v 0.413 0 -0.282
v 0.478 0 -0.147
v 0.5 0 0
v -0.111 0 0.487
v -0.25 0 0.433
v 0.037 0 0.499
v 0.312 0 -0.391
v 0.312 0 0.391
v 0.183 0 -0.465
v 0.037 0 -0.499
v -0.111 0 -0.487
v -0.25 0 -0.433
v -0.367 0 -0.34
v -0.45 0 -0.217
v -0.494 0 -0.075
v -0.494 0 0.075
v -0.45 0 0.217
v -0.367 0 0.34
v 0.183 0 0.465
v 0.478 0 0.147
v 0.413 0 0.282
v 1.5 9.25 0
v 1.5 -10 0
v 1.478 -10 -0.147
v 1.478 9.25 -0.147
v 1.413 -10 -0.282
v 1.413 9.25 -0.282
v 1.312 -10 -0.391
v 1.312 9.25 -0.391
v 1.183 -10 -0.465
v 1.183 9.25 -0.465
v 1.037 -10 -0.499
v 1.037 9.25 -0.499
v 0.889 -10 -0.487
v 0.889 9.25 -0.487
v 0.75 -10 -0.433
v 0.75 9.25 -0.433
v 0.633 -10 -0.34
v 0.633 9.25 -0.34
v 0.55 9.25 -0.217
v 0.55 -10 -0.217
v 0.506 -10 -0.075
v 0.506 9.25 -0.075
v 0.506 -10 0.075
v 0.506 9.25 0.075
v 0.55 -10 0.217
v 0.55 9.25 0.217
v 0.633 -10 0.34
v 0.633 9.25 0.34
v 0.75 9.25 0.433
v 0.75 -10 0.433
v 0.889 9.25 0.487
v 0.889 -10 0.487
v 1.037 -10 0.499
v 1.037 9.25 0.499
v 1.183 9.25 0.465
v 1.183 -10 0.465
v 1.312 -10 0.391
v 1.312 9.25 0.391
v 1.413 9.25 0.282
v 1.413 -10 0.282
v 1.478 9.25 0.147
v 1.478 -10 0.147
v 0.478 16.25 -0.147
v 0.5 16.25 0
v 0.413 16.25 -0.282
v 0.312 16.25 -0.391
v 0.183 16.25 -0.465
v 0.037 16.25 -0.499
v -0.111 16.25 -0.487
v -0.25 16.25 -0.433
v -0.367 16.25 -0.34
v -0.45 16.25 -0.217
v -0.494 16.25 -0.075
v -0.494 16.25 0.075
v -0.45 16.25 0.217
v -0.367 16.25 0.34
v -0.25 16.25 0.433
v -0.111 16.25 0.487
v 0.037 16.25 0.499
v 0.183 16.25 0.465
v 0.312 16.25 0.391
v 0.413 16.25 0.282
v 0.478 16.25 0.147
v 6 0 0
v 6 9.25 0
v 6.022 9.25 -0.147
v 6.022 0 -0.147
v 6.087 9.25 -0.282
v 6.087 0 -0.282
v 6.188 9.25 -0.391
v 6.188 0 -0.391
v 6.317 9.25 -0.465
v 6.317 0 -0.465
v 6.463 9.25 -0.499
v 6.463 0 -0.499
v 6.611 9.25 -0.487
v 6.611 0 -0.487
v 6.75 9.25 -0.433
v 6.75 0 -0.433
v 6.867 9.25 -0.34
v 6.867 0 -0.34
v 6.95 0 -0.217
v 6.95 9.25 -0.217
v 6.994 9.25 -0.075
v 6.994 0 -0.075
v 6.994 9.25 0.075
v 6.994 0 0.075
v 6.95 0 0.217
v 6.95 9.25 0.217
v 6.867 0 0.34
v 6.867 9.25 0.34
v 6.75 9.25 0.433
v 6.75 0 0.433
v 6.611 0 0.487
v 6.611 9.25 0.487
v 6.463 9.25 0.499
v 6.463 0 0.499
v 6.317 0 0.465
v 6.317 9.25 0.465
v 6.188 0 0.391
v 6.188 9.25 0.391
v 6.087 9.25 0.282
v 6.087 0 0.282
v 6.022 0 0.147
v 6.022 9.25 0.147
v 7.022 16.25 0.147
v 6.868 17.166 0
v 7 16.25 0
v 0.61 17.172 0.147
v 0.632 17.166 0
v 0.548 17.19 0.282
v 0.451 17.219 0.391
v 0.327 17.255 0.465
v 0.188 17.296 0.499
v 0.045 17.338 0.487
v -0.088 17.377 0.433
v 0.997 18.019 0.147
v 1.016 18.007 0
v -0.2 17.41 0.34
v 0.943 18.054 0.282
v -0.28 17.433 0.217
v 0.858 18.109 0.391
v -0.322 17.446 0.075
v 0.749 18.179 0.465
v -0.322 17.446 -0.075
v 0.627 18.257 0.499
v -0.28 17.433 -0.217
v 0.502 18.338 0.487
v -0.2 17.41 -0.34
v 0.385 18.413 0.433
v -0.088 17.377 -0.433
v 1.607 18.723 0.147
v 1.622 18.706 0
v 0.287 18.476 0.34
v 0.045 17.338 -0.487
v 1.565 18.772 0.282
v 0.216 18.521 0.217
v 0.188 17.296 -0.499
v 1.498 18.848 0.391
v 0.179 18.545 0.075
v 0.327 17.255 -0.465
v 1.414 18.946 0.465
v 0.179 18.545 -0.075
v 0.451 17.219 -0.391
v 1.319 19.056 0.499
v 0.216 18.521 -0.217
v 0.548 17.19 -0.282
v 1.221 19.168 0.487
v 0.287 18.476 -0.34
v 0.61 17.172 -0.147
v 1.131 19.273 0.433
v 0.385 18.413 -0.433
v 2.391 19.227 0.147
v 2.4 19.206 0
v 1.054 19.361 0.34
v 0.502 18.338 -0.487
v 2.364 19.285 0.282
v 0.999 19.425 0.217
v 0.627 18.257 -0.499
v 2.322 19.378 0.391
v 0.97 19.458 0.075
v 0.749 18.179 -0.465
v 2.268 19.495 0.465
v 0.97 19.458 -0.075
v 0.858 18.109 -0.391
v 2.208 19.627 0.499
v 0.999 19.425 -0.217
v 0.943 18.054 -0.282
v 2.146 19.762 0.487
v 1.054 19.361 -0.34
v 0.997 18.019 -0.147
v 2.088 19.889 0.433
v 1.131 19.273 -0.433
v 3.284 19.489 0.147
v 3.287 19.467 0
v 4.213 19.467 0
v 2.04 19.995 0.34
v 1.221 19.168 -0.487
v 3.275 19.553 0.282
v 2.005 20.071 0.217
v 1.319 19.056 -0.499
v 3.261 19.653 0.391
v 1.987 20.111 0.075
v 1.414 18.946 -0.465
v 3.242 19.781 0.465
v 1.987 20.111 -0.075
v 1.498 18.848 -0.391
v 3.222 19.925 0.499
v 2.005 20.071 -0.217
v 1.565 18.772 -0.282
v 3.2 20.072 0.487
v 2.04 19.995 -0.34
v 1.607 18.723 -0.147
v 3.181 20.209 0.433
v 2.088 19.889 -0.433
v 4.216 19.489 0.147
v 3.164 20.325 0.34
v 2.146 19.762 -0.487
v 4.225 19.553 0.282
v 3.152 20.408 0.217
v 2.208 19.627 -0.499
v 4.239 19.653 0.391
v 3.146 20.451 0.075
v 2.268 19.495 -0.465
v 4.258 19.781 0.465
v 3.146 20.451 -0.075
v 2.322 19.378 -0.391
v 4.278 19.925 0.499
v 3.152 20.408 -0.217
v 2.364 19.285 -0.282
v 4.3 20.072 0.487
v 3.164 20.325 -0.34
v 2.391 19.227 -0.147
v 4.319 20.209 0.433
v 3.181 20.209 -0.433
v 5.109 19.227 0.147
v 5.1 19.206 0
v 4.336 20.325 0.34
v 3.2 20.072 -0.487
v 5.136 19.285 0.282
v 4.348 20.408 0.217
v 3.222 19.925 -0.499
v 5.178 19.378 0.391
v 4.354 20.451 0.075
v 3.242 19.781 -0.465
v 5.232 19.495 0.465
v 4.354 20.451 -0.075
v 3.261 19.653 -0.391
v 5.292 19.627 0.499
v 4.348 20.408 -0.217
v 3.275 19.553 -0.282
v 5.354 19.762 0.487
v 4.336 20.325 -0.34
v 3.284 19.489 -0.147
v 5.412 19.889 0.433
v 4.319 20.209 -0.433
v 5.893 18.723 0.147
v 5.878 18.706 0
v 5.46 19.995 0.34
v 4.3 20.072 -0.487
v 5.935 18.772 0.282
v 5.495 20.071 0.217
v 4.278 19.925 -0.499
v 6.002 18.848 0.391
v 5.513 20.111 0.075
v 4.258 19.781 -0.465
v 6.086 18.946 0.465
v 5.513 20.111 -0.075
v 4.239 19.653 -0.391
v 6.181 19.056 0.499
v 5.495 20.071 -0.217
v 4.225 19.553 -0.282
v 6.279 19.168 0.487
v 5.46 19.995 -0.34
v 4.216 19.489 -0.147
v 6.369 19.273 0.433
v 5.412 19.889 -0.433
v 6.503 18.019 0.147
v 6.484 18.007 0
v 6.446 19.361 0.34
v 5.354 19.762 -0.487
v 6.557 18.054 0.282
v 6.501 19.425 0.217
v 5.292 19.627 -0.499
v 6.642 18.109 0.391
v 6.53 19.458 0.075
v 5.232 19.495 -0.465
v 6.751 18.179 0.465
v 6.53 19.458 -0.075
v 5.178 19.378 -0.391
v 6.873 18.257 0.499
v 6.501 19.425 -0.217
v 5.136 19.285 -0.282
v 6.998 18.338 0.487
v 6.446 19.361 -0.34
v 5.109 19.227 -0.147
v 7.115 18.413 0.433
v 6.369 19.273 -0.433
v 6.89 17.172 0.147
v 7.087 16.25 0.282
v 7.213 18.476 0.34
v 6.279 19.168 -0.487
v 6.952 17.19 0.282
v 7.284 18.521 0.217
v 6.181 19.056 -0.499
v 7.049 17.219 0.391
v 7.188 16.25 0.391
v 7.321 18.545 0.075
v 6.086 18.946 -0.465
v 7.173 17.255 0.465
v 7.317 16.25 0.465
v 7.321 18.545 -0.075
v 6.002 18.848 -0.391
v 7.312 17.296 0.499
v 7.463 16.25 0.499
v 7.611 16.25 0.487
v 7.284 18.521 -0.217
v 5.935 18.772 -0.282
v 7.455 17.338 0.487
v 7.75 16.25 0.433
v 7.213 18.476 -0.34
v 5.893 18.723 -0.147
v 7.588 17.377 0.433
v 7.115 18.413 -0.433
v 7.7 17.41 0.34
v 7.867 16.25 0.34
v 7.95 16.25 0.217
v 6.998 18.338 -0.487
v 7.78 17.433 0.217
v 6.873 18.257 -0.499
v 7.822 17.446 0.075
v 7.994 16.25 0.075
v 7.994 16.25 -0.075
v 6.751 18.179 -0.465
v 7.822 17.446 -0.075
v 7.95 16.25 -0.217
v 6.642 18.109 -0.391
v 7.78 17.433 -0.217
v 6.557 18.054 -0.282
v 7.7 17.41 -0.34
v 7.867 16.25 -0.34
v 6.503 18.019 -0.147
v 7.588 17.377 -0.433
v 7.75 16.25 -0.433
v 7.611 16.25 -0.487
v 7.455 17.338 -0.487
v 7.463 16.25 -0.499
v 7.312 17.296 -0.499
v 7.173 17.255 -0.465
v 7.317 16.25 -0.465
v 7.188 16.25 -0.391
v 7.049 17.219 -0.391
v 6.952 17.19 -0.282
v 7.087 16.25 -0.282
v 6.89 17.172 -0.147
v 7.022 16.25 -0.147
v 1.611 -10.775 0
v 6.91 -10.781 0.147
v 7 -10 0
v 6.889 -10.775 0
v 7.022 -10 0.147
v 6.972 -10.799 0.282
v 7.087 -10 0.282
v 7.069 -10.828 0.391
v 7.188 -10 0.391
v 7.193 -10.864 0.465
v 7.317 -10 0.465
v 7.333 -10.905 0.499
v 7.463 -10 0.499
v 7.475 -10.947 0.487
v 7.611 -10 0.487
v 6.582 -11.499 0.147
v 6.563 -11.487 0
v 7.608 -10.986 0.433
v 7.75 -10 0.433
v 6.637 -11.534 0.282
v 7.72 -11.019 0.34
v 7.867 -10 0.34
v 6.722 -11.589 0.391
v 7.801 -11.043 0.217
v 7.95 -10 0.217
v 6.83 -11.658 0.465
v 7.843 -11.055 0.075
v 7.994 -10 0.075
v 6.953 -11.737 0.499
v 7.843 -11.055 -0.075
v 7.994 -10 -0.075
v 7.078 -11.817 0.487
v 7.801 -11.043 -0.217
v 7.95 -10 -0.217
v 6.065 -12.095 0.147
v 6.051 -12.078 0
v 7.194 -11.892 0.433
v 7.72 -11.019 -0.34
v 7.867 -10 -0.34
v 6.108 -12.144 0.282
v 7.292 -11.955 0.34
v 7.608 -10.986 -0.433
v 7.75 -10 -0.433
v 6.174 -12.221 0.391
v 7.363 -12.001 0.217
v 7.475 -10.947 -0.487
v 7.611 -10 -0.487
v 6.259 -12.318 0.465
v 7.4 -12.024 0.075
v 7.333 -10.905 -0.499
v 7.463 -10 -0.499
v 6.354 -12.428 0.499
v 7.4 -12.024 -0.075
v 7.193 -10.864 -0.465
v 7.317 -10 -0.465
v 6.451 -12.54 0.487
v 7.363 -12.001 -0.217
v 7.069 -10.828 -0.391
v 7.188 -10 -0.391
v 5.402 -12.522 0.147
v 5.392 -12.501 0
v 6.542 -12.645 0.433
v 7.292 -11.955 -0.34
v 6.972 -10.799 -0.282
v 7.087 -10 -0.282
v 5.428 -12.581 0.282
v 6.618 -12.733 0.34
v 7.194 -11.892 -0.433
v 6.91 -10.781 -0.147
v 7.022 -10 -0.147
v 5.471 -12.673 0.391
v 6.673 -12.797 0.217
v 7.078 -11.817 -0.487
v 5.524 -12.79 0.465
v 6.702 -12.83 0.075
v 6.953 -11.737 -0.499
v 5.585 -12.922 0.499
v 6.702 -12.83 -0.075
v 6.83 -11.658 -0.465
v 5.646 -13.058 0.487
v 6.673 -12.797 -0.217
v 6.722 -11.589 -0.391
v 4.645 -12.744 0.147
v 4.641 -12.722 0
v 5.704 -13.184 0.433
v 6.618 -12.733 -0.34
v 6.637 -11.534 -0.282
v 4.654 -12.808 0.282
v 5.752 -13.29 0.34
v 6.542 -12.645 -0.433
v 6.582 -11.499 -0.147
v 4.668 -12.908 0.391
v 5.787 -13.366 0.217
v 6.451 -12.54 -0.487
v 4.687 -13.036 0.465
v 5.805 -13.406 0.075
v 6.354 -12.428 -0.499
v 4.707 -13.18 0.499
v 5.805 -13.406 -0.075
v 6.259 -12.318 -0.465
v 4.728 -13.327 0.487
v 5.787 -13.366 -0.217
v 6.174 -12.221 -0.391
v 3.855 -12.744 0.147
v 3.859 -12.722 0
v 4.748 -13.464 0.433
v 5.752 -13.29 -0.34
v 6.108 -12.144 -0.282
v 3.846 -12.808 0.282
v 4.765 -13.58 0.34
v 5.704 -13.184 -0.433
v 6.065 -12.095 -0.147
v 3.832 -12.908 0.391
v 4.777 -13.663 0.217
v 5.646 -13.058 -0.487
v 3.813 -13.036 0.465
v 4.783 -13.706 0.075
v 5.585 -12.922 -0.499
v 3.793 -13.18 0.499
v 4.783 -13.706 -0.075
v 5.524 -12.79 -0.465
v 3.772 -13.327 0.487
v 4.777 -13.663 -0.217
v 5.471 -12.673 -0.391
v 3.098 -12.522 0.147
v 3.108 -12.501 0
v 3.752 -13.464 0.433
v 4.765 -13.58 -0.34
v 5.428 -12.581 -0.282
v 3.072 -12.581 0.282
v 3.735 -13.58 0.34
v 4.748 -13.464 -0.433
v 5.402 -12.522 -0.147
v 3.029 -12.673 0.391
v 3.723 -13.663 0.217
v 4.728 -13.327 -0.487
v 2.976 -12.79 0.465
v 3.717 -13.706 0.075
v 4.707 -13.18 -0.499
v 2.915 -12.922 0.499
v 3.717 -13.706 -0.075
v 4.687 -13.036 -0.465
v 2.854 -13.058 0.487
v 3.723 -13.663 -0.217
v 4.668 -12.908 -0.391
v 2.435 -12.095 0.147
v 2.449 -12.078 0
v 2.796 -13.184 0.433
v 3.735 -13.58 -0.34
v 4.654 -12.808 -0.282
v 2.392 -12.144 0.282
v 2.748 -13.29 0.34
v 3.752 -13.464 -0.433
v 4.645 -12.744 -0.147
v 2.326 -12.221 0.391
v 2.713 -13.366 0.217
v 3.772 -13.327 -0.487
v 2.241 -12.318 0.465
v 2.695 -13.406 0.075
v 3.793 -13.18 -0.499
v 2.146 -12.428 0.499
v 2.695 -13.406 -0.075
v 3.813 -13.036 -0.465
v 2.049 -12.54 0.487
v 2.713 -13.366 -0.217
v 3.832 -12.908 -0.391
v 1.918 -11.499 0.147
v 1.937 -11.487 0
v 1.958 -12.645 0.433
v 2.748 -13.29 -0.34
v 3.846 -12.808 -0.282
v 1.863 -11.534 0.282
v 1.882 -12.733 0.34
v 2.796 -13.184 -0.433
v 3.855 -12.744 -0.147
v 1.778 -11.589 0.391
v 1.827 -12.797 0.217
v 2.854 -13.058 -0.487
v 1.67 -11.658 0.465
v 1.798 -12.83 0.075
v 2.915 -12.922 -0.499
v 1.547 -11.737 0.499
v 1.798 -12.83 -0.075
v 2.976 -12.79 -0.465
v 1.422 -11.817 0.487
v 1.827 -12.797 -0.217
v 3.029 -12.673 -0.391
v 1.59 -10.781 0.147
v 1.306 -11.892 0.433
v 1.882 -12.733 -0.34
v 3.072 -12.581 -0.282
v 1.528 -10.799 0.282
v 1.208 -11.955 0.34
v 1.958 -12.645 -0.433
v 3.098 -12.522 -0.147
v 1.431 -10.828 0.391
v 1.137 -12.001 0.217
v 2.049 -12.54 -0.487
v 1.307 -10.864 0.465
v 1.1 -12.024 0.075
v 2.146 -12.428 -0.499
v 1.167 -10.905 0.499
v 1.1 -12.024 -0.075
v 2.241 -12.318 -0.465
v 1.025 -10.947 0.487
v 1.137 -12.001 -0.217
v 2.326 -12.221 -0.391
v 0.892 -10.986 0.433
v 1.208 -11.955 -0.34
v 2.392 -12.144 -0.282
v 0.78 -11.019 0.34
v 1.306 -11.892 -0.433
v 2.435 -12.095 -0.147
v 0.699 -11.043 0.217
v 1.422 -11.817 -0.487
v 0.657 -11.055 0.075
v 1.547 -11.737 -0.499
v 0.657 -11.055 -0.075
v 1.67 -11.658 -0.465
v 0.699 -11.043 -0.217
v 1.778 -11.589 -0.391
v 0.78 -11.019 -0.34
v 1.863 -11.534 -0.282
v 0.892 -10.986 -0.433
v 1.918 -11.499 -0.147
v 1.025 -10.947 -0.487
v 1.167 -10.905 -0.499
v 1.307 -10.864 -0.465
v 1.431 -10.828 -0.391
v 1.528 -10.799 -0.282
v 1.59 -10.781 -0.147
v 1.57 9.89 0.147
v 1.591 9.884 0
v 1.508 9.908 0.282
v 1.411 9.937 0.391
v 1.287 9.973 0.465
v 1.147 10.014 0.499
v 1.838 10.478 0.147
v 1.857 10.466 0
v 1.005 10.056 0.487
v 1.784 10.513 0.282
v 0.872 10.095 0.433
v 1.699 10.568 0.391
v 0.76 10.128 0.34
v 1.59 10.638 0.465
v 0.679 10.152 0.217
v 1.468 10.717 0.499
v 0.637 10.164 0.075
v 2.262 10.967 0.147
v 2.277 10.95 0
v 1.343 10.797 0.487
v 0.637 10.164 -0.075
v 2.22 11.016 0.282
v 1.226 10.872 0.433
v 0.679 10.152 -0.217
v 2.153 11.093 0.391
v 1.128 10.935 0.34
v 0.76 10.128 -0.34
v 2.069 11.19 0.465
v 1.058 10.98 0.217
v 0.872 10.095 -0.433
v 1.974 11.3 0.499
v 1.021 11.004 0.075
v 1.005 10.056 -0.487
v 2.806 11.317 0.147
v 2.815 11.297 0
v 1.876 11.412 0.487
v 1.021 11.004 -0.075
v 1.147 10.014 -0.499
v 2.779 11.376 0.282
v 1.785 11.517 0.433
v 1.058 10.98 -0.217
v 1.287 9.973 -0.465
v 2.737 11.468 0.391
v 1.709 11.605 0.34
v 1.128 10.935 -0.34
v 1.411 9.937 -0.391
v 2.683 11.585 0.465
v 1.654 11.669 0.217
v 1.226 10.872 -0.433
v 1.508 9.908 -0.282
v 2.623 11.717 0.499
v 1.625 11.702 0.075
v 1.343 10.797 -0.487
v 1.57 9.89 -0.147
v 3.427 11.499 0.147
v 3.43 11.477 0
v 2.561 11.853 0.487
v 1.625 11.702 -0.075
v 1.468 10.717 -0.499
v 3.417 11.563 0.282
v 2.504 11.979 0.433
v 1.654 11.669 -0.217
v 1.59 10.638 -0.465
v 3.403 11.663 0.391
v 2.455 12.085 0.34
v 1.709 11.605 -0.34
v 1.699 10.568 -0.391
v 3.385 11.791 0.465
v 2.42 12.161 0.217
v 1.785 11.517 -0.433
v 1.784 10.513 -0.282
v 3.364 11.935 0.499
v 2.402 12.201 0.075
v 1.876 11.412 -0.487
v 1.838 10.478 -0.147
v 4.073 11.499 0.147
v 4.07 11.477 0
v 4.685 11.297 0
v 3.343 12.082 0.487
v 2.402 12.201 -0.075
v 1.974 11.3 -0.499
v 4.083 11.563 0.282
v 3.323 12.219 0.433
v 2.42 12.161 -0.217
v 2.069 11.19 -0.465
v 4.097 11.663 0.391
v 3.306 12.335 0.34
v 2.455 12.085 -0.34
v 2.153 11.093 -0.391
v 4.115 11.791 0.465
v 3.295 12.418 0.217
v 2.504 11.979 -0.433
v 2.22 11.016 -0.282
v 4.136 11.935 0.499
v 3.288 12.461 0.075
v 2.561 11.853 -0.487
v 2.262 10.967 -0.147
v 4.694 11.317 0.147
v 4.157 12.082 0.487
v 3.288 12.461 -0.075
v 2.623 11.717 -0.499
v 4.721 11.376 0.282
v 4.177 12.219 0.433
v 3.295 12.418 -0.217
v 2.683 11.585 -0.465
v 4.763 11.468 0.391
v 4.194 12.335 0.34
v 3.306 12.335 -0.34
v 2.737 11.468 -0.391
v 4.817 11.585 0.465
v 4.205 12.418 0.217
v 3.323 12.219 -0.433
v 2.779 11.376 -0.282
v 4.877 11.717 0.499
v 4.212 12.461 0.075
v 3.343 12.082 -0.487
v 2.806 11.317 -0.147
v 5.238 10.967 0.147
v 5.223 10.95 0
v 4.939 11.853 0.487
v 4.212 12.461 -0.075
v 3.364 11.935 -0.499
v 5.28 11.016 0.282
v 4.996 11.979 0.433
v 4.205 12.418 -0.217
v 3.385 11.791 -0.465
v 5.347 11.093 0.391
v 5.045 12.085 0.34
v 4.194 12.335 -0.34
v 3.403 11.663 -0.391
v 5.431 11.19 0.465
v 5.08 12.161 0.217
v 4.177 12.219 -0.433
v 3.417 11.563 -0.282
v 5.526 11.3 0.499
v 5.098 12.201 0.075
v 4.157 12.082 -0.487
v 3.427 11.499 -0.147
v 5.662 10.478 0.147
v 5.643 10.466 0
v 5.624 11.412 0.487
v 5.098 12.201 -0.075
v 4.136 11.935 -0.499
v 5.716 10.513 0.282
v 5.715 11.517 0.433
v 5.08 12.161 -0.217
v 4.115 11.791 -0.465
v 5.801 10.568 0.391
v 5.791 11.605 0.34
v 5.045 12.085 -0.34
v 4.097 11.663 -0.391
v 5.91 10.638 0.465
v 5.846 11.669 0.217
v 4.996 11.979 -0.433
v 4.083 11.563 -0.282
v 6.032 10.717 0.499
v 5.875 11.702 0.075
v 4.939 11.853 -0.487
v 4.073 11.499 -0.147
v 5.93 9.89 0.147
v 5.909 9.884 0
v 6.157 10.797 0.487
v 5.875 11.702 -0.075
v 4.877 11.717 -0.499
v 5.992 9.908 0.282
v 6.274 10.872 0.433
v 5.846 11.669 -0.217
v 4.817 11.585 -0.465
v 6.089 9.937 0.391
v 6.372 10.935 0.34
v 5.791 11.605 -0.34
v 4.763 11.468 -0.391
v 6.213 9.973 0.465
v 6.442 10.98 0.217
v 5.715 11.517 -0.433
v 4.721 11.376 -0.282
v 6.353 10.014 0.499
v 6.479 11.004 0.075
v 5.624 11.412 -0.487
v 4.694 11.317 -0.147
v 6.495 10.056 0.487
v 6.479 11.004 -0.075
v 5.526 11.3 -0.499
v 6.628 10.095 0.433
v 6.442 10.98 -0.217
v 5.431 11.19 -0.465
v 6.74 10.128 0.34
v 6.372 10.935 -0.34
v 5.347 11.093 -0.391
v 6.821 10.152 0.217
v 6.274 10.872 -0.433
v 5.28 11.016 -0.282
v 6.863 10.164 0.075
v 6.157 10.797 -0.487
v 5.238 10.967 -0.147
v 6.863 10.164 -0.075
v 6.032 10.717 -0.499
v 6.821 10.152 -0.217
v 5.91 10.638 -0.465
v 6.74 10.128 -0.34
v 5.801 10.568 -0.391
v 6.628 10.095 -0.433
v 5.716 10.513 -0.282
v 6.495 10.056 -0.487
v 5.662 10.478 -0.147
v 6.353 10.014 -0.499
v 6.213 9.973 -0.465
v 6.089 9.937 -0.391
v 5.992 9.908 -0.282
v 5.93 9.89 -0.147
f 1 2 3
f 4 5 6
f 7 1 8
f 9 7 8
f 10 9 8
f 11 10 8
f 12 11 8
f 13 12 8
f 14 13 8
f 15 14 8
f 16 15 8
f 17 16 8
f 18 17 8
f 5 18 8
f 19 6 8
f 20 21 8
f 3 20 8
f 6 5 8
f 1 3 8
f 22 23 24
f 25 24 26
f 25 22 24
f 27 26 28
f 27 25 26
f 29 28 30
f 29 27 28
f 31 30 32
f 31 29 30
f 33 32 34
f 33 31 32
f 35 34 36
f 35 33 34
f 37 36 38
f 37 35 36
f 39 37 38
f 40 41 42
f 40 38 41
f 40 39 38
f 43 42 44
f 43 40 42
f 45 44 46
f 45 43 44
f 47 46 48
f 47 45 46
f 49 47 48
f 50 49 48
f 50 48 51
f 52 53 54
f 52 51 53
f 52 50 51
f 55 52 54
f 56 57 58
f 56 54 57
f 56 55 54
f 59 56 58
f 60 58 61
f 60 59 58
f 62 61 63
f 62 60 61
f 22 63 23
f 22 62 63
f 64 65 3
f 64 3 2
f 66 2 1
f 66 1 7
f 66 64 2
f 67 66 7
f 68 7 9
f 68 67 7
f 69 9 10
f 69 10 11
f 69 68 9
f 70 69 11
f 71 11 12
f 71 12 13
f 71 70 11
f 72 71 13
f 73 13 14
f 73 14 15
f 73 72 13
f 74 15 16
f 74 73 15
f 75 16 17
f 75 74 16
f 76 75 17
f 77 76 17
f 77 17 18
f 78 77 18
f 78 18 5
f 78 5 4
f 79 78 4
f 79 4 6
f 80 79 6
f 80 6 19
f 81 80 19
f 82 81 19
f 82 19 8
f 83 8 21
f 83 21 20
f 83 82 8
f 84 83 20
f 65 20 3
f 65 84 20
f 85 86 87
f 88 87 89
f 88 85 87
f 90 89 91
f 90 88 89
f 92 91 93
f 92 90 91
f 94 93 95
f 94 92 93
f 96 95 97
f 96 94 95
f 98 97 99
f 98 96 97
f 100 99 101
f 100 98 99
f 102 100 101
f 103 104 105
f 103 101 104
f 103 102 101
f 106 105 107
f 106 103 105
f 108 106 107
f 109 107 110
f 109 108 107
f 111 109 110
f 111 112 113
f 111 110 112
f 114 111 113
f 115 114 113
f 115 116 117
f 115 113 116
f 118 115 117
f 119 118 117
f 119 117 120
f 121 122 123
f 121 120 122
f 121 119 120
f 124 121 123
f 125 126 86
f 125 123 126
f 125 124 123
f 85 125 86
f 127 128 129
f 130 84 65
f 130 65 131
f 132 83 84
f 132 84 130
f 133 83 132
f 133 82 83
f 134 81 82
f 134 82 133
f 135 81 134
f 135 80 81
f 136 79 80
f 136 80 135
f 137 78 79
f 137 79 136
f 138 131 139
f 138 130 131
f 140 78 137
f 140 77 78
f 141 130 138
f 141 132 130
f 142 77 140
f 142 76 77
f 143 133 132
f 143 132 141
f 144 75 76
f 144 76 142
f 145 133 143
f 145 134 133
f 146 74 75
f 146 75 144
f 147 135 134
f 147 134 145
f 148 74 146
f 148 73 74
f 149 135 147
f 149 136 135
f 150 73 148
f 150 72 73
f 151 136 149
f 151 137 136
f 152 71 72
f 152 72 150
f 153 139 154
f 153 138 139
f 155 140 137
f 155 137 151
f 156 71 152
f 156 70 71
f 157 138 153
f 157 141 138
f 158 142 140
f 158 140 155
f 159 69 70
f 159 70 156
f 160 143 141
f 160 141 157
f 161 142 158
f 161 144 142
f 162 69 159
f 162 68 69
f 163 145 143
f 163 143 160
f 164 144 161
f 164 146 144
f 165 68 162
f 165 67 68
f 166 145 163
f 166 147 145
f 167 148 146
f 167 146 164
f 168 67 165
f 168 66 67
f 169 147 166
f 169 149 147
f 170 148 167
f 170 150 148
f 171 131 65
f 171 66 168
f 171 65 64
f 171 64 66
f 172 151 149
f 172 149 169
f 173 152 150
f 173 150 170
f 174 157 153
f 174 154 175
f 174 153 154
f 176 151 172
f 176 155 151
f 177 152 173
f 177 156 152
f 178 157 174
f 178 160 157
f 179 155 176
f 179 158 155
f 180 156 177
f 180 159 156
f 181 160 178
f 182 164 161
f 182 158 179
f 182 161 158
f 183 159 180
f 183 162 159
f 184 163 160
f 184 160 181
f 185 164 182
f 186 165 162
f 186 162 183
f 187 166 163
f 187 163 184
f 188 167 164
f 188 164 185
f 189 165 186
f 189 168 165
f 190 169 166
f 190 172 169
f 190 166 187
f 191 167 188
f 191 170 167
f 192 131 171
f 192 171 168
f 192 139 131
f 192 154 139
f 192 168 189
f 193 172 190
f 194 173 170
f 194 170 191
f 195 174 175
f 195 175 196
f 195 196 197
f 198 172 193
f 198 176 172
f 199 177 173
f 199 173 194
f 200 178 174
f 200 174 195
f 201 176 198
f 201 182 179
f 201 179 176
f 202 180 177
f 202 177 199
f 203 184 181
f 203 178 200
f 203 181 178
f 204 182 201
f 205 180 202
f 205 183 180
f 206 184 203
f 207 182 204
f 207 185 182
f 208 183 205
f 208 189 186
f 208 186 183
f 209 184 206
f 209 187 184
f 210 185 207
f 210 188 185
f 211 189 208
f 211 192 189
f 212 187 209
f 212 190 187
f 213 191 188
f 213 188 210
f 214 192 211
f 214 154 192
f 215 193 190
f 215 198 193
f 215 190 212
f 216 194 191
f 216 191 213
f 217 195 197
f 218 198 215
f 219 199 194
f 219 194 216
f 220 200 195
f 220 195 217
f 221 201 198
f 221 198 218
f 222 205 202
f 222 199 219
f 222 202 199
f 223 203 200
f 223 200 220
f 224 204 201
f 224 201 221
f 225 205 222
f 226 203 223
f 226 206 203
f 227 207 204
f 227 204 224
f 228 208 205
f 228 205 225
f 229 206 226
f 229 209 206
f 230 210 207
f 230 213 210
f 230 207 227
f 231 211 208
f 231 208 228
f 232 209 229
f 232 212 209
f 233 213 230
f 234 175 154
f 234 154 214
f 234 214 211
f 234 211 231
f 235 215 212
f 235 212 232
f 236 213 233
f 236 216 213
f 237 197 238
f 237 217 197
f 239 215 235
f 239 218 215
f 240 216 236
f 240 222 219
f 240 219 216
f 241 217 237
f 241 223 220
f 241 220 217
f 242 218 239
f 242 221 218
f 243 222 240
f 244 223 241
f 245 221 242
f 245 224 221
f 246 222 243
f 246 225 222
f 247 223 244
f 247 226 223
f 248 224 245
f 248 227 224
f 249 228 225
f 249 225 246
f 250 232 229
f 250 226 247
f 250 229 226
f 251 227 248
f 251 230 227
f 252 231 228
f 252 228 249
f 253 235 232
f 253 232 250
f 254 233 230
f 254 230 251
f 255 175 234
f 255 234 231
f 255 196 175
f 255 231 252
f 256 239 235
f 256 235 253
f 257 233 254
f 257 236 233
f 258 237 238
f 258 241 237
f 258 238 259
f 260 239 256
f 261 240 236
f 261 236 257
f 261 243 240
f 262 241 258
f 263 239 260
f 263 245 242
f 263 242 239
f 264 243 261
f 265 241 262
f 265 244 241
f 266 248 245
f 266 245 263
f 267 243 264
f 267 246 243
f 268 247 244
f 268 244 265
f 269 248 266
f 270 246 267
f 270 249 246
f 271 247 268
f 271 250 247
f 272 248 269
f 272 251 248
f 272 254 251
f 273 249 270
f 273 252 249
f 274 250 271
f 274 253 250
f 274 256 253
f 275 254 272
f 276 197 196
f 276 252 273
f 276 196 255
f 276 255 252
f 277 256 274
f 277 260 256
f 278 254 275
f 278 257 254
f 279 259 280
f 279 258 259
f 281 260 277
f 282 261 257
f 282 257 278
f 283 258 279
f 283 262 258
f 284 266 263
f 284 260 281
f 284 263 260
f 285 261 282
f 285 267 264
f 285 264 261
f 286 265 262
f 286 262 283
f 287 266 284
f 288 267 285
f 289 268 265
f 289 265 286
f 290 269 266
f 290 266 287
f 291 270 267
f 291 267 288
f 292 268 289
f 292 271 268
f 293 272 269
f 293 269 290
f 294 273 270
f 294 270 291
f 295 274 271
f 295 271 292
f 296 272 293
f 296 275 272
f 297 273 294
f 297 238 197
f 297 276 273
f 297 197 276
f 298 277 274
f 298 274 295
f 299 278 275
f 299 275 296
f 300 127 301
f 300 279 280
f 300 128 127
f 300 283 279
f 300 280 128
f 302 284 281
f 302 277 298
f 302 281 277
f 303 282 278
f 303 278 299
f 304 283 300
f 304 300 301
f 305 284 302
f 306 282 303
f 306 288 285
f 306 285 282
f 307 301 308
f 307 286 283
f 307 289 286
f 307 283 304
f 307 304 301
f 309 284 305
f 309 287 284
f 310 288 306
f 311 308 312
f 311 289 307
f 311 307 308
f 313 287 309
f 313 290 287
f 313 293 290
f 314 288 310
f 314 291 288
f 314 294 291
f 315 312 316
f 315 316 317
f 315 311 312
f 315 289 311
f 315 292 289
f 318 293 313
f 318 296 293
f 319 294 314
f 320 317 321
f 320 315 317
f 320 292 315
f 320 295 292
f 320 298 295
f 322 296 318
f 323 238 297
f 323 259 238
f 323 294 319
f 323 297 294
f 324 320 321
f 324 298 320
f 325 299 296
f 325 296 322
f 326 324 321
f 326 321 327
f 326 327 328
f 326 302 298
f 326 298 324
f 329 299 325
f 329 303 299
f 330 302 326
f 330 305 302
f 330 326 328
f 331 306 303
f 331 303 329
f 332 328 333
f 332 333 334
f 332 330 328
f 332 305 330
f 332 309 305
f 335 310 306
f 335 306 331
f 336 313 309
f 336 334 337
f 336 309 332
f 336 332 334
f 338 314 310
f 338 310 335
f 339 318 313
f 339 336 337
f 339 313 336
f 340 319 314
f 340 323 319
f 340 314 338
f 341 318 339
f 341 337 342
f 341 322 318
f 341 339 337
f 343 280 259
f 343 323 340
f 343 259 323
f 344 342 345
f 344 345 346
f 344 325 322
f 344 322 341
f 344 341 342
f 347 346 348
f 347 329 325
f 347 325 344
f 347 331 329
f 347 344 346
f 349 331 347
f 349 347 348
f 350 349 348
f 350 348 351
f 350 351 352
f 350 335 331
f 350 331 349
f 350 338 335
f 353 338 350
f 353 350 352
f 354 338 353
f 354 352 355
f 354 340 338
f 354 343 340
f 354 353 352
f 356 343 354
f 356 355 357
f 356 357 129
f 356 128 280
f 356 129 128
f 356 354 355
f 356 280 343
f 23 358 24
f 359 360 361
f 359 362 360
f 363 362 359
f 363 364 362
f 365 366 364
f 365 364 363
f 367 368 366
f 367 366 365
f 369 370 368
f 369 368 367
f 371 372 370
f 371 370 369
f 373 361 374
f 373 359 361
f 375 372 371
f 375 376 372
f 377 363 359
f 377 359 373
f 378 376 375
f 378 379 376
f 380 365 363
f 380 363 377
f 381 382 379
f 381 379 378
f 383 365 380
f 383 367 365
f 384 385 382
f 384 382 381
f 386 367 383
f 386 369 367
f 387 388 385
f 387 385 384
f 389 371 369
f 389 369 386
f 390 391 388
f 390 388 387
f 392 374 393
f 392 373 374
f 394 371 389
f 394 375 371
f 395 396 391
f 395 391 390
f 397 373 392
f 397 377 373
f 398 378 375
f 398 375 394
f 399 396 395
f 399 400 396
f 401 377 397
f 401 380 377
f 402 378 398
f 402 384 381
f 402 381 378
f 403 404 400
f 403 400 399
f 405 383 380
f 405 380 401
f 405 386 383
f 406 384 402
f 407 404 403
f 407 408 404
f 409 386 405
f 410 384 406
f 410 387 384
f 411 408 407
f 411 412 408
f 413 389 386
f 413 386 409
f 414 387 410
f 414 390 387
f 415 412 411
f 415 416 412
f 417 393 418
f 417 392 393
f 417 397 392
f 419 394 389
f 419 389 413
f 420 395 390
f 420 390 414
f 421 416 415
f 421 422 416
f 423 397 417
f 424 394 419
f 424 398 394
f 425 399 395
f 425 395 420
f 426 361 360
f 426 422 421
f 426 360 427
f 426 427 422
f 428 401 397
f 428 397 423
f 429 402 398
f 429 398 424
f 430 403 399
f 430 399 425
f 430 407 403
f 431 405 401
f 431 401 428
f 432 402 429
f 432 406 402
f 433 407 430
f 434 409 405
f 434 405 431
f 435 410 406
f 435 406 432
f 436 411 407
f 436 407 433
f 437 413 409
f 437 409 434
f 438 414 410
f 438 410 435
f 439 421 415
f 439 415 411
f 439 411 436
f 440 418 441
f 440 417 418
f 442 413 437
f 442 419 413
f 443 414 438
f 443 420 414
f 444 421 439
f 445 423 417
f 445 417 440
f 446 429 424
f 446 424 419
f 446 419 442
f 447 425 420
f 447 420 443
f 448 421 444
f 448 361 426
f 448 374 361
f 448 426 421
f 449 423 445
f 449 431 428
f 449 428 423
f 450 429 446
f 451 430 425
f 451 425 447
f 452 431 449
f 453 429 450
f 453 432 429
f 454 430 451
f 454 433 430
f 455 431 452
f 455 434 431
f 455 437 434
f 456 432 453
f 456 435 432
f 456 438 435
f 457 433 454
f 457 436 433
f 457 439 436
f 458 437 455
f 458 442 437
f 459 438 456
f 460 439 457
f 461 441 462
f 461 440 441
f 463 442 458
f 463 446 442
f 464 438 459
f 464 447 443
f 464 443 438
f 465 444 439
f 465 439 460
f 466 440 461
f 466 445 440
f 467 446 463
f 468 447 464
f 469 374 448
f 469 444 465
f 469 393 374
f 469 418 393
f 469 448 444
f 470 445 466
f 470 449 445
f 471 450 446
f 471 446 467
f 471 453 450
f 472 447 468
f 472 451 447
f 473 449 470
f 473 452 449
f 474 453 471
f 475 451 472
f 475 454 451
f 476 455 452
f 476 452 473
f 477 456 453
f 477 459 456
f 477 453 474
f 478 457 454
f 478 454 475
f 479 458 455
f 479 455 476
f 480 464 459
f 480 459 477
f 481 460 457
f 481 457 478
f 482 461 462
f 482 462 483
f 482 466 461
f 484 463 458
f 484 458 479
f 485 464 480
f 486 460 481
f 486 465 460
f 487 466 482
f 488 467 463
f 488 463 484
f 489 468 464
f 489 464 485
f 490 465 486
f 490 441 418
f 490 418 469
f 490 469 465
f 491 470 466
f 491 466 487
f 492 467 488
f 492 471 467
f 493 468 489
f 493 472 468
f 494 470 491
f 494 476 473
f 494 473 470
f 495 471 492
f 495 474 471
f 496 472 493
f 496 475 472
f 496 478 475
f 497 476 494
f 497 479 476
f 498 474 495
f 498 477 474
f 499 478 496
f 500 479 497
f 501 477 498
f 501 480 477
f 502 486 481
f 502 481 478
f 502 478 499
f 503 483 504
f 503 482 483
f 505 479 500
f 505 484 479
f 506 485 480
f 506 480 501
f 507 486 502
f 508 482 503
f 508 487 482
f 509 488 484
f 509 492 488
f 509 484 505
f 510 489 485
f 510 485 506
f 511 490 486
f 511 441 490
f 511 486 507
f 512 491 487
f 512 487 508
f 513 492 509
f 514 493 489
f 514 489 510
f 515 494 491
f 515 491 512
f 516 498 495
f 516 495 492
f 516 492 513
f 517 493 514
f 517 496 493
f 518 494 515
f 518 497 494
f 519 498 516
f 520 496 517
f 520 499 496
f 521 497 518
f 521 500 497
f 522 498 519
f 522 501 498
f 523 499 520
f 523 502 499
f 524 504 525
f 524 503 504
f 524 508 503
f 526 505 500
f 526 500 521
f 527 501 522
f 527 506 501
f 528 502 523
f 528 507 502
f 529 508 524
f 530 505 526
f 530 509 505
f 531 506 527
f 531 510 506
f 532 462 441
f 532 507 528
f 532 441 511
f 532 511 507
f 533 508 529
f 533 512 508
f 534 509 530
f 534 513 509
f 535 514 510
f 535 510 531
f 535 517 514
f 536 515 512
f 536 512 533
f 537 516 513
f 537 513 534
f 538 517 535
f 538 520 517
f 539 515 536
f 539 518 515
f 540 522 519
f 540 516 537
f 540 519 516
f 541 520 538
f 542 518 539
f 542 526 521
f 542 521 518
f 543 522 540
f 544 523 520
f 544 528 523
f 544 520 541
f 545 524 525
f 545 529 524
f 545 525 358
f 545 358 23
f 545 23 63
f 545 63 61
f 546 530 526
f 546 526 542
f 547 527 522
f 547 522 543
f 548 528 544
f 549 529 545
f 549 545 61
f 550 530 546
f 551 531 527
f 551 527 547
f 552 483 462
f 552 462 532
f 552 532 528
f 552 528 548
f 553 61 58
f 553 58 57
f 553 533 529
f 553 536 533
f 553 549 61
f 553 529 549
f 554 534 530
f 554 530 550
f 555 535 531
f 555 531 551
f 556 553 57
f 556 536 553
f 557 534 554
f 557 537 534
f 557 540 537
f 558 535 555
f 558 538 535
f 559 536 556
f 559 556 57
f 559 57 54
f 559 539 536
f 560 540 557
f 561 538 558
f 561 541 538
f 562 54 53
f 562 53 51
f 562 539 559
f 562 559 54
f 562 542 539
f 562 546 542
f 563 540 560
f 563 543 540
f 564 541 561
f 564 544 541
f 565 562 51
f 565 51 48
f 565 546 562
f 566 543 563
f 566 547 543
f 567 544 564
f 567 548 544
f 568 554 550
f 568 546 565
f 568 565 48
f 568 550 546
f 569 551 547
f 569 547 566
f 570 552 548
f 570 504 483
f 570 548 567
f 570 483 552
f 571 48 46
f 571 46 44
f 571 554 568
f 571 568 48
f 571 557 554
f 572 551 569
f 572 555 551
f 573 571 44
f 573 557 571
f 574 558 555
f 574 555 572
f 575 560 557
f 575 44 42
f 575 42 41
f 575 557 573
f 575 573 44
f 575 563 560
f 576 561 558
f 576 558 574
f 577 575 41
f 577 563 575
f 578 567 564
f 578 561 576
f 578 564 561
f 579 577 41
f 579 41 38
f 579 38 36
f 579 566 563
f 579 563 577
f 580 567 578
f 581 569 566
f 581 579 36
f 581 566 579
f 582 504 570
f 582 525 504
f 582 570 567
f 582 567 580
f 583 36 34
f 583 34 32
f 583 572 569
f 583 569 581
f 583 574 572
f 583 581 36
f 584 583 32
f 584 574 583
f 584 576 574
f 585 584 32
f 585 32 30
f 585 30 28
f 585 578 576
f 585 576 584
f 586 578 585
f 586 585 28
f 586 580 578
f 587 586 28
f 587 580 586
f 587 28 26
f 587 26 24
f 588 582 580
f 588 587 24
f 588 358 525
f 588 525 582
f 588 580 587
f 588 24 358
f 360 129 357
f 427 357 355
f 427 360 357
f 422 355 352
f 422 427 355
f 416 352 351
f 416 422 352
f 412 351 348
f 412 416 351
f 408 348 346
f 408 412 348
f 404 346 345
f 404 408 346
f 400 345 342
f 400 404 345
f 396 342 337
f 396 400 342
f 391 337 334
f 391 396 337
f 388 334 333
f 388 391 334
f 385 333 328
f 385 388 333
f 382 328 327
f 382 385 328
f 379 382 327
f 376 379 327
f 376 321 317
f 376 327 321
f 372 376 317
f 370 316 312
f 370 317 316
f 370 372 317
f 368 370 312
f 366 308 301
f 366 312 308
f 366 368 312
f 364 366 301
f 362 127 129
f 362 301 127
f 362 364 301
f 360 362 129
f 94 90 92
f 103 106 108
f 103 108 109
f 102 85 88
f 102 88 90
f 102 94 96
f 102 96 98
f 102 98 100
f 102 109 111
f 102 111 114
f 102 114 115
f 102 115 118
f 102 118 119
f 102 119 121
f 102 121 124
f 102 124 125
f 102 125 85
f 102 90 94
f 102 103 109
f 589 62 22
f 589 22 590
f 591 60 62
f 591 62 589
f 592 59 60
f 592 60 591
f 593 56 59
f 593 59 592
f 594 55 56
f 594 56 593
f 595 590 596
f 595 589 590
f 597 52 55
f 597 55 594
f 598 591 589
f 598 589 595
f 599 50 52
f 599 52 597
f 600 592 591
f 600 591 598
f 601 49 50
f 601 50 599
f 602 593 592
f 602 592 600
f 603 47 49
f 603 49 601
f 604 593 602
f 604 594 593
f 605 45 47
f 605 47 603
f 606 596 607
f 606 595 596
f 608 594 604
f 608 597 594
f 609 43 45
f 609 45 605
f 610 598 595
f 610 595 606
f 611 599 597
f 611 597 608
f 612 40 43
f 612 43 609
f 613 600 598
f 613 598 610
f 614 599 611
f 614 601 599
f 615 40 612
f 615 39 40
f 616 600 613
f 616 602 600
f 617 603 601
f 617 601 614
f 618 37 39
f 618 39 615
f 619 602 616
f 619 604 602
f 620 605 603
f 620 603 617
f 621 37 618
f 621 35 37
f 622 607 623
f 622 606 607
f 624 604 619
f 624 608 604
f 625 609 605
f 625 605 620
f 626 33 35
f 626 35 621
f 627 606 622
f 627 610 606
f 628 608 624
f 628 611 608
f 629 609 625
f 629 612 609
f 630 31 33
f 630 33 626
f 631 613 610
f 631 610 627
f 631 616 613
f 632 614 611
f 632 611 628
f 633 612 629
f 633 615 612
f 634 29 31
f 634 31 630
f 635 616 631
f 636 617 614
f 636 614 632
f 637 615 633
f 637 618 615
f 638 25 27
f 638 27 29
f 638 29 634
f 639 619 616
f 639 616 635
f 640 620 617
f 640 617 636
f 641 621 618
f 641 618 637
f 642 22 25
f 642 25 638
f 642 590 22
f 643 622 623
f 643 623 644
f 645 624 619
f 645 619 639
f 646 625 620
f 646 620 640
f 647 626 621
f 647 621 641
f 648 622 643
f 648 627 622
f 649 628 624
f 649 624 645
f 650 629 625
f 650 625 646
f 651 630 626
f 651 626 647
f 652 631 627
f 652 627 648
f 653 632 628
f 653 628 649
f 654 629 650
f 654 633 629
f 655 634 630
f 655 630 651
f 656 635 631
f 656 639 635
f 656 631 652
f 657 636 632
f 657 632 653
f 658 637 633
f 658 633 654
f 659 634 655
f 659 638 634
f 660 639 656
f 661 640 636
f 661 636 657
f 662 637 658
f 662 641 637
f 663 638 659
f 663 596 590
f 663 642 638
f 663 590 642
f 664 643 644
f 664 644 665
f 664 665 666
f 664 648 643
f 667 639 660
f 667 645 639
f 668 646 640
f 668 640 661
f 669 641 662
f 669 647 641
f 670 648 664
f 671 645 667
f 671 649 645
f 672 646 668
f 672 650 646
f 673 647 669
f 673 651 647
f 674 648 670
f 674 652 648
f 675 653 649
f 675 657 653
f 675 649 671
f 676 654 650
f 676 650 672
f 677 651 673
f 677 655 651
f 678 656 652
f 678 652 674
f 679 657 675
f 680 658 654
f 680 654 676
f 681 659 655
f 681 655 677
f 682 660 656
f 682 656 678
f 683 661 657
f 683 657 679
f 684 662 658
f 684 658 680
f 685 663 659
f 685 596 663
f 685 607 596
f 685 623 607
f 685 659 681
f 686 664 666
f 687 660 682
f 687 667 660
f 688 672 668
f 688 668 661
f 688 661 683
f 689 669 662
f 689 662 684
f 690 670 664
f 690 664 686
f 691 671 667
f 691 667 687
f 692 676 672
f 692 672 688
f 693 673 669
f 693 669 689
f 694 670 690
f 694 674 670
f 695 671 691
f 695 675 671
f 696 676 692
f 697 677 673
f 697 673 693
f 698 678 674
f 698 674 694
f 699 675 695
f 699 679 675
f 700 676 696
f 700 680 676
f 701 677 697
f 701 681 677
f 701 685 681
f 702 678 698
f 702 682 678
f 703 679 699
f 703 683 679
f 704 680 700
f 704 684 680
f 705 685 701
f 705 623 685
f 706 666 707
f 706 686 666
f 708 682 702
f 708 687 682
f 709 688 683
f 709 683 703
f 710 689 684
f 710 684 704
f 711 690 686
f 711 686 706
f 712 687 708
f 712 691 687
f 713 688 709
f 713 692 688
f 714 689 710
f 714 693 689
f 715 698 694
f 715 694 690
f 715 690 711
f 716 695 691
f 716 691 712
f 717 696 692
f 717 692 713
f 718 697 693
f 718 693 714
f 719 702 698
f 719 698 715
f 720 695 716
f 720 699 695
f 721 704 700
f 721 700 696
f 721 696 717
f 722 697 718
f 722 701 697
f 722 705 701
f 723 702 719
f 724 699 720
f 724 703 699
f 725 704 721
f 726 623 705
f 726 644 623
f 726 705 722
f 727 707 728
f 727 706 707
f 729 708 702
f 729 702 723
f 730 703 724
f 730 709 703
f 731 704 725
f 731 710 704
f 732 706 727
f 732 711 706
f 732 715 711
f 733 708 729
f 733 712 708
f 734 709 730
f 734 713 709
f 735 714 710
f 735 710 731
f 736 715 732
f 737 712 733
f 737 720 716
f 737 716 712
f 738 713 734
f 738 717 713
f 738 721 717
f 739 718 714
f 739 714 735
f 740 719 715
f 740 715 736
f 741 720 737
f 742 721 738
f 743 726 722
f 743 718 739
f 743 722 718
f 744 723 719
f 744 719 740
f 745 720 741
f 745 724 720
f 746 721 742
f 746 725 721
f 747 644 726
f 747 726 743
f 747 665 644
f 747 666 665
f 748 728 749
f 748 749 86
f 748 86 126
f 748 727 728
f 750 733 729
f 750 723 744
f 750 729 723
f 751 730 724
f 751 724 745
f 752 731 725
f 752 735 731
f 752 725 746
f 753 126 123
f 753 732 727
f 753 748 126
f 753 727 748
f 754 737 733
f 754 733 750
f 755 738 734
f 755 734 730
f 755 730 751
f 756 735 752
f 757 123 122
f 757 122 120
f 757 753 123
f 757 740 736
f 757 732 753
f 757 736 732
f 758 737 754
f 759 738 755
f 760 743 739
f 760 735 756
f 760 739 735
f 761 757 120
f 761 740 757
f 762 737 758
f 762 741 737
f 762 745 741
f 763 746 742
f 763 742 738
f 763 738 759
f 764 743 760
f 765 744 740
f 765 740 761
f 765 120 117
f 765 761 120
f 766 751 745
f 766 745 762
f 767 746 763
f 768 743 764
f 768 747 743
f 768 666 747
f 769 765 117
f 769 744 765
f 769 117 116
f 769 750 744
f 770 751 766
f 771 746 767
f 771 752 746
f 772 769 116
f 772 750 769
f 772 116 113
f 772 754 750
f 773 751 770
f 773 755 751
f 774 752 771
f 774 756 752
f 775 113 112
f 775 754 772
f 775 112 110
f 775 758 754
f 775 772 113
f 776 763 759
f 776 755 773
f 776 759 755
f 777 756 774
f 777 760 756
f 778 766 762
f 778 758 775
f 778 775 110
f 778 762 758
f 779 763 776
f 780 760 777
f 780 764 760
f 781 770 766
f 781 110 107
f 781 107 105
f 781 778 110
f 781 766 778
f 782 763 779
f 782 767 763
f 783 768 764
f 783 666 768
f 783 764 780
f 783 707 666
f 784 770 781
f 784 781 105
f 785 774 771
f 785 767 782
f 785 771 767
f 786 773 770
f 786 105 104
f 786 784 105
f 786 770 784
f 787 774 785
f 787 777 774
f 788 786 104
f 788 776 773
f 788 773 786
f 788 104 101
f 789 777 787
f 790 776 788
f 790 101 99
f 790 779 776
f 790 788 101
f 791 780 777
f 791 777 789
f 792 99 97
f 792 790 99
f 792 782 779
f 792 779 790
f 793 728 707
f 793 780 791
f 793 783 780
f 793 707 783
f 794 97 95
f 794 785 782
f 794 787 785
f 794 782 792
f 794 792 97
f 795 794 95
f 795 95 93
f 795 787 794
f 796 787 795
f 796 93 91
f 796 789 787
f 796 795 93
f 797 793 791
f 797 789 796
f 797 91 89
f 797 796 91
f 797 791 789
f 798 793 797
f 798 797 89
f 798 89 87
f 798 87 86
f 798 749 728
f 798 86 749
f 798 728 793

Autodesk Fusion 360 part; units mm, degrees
sketch "Sweep" plane through (0, 0, 0) normal (0, 0, 1) x (1, 0, 0)
  line L0 (0, 0) -> (0, 16.25)
  line L1 (0, 16.25) -> (7.5, 16.25) construction
  line L2 (7.5, 16.25) -> (7.5, -10)
  line L3 (1, -10) -> (1, 9.25)
  line L4 (7.5, -10) -> (1, -10) construction
  line L5 (1, 9.25) -> (6.5, 9.25) construction
  line L6 (6.5, 9.25) -> (6.5, 0)
  arc A0 (7.5, 16.25) -> (0, 16.25) centre (3.75, 16.25) ccw
  arc A1 (6.5, 9.25) -> (1, 9.25) centre (3.75, 9.25) ccw
  arc A2 (1, -10) -> (7.5, -10) centre (4.25, -10) ccw
  dimension "d1" = 16.25
  dimension "d2" = 7.5
  dimension "d4" = 19.25
  dimension "d5" = 5.5
  dimension "d6" = 26.25
  dimension "d7" = 6.5
  dimension "d8" = 9.25
sketch "Sketch2" plane through (0, 0, 0) normal (0, 1, 0) x (1, 0, 0)
  circle A0 centre (0, 0) radius 0.5
  dimension "d9" = 1
sweep "Sweep1" add profiles "Sketch2" path "Sweep" along L0 A0 L2 A2 L3 A1 L6 section 1
